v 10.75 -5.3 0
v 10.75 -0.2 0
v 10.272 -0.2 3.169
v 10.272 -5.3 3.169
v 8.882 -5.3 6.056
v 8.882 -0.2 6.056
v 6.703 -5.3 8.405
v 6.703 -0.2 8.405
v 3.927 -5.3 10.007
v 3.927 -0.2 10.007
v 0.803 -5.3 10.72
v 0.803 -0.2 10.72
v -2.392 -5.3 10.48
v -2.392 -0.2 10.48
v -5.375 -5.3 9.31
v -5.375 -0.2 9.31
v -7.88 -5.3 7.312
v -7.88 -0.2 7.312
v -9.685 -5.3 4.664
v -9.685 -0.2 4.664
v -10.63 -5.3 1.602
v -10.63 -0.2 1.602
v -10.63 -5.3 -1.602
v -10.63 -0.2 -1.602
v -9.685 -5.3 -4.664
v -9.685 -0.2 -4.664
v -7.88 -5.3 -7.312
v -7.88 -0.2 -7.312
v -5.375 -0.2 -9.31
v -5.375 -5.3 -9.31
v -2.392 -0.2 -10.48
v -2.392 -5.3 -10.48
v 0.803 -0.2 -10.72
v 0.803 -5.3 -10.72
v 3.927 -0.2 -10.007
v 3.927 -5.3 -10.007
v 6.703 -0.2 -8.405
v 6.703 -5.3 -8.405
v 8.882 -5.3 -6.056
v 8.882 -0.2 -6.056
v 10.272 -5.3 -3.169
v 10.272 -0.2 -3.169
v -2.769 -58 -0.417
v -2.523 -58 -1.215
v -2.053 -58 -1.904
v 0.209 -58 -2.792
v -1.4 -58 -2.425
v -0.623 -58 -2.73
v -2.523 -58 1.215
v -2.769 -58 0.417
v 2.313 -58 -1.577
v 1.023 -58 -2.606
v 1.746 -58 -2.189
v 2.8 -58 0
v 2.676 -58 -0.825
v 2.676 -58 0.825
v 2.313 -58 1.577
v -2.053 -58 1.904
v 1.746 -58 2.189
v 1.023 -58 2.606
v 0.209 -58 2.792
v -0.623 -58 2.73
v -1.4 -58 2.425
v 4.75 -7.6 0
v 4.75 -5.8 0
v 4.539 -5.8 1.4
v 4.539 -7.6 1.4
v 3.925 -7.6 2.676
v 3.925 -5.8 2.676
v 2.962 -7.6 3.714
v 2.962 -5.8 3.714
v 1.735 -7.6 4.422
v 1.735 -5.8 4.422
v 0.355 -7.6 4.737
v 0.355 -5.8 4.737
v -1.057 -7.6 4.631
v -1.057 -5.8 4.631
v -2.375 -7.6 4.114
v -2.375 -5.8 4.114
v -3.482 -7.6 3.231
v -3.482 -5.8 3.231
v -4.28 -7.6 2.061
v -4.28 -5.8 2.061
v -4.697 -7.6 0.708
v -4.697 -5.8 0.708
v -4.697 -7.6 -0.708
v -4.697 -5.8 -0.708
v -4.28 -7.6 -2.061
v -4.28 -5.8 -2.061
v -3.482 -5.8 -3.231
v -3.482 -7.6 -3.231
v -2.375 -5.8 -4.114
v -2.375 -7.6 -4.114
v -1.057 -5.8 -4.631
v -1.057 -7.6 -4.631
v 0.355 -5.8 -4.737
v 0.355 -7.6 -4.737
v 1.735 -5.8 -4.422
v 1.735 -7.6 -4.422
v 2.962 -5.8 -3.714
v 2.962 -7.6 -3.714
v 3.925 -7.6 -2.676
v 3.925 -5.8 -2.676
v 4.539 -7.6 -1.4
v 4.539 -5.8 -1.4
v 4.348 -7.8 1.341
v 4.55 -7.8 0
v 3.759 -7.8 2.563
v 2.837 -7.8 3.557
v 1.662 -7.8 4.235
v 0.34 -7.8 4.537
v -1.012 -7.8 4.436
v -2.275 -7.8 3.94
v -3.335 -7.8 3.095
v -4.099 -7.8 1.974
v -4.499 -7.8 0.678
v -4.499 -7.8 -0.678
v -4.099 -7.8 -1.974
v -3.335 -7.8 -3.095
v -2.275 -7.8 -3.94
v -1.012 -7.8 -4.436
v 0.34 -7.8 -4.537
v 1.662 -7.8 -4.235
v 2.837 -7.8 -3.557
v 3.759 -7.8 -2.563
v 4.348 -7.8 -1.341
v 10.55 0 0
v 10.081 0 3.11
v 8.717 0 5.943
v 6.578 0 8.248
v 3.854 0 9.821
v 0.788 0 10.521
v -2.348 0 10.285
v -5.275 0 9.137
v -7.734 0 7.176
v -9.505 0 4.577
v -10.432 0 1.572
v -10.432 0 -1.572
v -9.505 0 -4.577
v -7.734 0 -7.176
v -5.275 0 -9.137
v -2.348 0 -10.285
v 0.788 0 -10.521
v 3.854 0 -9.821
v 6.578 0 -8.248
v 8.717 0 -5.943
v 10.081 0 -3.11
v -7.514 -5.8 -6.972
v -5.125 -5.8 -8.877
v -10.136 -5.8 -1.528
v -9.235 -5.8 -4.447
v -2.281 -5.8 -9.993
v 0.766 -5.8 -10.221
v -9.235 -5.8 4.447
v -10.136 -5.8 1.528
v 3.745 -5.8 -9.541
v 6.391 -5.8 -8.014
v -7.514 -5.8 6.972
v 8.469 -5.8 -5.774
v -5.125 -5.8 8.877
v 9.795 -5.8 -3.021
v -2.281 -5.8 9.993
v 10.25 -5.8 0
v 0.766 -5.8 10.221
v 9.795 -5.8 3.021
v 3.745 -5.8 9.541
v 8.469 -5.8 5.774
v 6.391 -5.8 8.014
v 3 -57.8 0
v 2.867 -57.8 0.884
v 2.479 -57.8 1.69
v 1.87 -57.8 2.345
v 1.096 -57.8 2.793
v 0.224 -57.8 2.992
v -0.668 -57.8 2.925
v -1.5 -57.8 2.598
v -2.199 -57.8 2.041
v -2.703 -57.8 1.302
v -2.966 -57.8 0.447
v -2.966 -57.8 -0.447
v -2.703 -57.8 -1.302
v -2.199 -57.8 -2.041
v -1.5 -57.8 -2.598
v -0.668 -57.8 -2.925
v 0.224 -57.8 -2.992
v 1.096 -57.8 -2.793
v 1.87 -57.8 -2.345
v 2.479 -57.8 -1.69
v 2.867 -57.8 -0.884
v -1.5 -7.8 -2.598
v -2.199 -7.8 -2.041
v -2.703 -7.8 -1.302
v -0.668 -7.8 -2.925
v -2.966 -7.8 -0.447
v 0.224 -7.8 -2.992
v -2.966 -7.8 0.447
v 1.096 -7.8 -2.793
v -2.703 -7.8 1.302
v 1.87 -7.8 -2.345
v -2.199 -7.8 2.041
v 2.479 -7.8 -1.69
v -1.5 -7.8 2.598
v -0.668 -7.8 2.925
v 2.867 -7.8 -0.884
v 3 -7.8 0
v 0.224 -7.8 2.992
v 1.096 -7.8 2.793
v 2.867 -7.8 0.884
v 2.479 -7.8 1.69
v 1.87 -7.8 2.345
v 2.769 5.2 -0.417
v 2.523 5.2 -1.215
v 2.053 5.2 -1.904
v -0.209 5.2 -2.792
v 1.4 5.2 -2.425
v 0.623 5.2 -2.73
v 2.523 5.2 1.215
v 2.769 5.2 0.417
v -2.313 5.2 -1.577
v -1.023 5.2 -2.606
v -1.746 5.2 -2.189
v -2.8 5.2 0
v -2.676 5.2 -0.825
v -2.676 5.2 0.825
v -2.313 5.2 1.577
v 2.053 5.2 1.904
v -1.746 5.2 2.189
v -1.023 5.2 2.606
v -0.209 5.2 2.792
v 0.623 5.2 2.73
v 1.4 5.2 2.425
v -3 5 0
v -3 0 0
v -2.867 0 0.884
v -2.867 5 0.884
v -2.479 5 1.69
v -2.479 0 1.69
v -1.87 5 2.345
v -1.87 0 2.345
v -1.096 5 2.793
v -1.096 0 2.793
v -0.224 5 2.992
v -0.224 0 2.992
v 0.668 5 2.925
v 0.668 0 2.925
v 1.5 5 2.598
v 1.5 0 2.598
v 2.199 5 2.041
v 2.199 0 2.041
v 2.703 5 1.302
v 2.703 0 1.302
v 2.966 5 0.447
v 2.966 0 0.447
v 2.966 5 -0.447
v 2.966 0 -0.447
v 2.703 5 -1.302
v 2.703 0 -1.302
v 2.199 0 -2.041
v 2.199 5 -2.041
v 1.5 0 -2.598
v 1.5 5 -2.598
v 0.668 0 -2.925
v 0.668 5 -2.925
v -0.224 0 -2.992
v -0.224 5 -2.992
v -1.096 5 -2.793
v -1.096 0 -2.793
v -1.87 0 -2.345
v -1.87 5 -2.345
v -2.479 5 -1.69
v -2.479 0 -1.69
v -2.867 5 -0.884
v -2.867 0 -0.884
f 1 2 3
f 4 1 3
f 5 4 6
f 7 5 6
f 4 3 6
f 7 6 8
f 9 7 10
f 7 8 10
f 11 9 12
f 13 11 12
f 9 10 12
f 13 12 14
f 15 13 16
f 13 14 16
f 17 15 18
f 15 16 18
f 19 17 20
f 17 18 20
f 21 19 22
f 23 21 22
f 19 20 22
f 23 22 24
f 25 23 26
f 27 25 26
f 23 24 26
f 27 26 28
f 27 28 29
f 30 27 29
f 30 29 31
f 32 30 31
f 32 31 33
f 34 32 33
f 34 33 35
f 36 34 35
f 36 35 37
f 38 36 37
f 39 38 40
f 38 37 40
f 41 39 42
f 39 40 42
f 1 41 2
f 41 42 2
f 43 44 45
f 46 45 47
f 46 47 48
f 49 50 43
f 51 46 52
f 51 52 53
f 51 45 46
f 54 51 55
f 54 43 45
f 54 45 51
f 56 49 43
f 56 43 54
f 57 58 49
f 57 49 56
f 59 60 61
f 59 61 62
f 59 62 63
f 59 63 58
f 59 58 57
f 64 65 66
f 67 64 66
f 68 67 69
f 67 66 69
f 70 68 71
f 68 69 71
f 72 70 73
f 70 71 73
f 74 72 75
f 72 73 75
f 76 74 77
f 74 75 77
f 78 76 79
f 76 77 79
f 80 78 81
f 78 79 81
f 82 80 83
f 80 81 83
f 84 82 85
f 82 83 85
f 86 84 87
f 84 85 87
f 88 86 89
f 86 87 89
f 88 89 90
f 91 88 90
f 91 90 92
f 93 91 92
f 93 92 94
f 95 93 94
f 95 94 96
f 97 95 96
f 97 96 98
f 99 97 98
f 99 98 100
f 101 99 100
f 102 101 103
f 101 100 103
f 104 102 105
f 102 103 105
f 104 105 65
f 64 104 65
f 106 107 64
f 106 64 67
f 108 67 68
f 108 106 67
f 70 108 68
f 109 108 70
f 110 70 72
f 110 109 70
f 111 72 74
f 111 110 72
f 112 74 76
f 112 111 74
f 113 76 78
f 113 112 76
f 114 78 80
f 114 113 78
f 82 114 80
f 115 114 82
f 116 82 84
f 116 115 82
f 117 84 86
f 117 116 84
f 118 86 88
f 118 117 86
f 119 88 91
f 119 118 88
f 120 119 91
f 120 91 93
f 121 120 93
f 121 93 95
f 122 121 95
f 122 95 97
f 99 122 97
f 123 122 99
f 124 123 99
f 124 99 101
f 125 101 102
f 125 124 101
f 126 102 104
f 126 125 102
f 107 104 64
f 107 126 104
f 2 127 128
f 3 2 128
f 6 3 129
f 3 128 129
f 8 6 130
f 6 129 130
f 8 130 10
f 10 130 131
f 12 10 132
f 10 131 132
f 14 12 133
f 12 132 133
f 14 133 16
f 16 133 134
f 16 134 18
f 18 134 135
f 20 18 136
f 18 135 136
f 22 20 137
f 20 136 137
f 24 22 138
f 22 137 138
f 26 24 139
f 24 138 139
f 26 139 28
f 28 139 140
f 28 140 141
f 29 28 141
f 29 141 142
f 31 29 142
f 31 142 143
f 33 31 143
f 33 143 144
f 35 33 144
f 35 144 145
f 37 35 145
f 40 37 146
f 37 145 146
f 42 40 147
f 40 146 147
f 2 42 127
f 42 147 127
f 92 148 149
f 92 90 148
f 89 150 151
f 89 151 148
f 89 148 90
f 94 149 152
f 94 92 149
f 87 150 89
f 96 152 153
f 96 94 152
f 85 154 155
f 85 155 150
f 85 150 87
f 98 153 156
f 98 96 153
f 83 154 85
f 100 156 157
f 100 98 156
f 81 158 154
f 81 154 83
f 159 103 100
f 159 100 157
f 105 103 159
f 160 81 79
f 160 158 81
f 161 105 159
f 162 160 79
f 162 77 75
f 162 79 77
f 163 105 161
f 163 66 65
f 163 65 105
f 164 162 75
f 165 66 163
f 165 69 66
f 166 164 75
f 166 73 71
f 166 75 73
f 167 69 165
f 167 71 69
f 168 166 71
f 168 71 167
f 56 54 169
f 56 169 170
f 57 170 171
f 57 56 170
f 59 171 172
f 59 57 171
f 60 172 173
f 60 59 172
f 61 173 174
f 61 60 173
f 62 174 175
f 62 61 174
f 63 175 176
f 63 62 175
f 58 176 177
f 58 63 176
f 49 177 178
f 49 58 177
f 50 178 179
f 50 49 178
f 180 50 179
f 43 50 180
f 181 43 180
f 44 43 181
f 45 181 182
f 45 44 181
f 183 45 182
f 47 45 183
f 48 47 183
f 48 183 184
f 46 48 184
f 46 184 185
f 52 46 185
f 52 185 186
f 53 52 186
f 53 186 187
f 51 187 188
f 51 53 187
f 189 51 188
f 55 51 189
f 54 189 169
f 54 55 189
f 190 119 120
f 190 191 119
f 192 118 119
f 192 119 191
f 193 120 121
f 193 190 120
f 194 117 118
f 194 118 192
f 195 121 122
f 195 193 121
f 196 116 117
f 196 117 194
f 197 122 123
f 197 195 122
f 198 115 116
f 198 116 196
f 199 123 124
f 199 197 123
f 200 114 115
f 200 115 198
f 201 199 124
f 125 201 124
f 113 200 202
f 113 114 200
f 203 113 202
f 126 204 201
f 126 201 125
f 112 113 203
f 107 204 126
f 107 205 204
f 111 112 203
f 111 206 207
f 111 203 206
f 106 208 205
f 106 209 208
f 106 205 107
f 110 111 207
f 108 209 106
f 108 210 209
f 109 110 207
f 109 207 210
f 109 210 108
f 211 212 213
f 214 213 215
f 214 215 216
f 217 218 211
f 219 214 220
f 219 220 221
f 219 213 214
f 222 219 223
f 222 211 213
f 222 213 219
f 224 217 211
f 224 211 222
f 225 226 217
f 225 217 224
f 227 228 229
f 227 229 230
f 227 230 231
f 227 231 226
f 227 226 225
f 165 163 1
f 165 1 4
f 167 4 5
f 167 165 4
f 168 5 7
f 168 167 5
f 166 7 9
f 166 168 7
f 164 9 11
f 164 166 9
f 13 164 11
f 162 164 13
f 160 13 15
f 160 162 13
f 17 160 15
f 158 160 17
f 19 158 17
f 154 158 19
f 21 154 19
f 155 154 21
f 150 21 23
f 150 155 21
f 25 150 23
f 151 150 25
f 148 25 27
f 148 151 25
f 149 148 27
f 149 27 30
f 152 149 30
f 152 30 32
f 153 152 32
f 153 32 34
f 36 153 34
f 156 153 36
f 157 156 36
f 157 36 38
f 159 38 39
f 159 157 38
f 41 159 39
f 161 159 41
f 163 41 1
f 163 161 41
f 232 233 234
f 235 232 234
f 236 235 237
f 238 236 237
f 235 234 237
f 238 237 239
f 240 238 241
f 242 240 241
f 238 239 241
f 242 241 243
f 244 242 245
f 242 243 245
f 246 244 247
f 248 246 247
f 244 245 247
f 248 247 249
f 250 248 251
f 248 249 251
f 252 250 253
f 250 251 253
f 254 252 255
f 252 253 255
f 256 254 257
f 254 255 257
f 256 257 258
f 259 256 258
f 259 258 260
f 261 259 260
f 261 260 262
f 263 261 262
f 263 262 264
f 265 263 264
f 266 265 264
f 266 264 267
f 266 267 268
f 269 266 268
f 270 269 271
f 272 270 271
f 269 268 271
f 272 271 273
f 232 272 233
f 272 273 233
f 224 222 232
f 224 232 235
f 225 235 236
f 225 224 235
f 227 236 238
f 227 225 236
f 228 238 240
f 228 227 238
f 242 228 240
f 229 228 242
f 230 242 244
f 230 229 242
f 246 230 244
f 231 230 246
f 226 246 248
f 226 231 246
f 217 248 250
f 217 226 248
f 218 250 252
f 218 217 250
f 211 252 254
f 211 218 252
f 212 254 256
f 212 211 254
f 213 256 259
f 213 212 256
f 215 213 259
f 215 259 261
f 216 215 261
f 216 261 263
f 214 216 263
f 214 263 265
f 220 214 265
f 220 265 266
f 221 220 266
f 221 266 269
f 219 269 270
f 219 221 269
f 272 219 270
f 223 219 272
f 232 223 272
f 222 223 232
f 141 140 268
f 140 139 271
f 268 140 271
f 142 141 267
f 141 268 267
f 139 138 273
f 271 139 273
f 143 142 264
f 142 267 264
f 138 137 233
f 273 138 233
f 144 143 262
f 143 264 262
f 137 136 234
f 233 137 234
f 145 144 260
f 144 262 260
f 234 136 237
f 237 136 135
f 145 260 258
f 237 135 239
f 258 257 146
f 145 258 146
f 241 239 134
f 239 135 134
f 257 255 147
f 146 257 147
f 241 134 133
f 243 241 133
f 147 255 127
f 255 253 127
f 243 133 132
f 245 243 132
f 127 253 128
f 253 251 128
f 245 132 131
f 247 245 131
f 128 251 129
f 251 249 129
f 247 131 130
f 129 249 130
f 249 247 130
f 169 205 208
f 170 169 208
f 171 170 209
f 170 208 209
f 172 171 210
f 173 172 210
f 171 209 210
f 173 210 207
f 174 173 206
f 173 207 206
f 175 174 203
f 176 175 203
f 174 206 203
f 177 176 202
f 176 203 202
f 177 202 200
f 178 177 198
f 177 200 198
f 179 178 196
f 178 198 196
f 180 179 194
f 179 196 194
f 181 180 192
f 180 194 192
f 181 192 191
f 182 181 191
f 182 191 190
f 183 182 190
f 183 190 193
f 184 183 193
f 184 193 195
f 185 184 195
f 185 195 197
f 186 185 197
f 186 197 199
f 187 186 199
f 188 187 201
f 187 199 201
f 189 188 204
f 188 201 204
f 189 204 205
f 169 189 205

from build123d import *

# Parameters (mm, degrees)
F0_R     = 10.75
F1_DEPTH = 5.8
F2_R     = 4.75
F3_DEPTH = 2
F4_R     = 3
F5_DEPTH = 50.2
F6_R     = 3
F7_DEPTH = 5.2
F8_SIZE  = 0.5
F9_SIZE  = 0.2


with BuildPart() as f1:
    # F0 (on Front) → F1 (new body)
    with BuildSketch(Plane.XZ):
        Circle(F0_R)
    extrude(amount=F1_DEPTH)

    # F2 (on face) → F3 (join)
    with BuildSketch(Plane.XZ.offset(5.8)):
        Circle(F2_R)
    extrude(amount=F3_DEPTH)

    # F4 (on face) → F5 (join)
    with BuildSketch(Plane.XZ.offset(7.8)):
        Circle(F4_R)
    extrude(amount=F5_DEPTH)

    # F6 (on face) → F7 (join)
    with BuildSketch(Plane(origin=(0, 0, 0), x_dir=(-1, 0, 0), z_dir=(0, 1, 0))):
        Circle(F6_R)
    extrude(amount=F7_DEPTH)

    # F8
    f8_edges = [f1.edges().sort_by_distance(p)[0] for p in [
        (-10.75, -5.8, 0),
    ]]
    chamfer(f8_edges, length=F8_SIZE)

    # F9
    f9_edges = [f1.edges().sort_by_distance(p)[0] for p in [
        (-4.75, -7.8, 0),
        (-3, -58, 0),
        (3, 5.2, 0),
        (-10.75, 0, 0),
    ]]
    chamfer(f9_edges, length=F9_SIZE)


solid = f1.part
